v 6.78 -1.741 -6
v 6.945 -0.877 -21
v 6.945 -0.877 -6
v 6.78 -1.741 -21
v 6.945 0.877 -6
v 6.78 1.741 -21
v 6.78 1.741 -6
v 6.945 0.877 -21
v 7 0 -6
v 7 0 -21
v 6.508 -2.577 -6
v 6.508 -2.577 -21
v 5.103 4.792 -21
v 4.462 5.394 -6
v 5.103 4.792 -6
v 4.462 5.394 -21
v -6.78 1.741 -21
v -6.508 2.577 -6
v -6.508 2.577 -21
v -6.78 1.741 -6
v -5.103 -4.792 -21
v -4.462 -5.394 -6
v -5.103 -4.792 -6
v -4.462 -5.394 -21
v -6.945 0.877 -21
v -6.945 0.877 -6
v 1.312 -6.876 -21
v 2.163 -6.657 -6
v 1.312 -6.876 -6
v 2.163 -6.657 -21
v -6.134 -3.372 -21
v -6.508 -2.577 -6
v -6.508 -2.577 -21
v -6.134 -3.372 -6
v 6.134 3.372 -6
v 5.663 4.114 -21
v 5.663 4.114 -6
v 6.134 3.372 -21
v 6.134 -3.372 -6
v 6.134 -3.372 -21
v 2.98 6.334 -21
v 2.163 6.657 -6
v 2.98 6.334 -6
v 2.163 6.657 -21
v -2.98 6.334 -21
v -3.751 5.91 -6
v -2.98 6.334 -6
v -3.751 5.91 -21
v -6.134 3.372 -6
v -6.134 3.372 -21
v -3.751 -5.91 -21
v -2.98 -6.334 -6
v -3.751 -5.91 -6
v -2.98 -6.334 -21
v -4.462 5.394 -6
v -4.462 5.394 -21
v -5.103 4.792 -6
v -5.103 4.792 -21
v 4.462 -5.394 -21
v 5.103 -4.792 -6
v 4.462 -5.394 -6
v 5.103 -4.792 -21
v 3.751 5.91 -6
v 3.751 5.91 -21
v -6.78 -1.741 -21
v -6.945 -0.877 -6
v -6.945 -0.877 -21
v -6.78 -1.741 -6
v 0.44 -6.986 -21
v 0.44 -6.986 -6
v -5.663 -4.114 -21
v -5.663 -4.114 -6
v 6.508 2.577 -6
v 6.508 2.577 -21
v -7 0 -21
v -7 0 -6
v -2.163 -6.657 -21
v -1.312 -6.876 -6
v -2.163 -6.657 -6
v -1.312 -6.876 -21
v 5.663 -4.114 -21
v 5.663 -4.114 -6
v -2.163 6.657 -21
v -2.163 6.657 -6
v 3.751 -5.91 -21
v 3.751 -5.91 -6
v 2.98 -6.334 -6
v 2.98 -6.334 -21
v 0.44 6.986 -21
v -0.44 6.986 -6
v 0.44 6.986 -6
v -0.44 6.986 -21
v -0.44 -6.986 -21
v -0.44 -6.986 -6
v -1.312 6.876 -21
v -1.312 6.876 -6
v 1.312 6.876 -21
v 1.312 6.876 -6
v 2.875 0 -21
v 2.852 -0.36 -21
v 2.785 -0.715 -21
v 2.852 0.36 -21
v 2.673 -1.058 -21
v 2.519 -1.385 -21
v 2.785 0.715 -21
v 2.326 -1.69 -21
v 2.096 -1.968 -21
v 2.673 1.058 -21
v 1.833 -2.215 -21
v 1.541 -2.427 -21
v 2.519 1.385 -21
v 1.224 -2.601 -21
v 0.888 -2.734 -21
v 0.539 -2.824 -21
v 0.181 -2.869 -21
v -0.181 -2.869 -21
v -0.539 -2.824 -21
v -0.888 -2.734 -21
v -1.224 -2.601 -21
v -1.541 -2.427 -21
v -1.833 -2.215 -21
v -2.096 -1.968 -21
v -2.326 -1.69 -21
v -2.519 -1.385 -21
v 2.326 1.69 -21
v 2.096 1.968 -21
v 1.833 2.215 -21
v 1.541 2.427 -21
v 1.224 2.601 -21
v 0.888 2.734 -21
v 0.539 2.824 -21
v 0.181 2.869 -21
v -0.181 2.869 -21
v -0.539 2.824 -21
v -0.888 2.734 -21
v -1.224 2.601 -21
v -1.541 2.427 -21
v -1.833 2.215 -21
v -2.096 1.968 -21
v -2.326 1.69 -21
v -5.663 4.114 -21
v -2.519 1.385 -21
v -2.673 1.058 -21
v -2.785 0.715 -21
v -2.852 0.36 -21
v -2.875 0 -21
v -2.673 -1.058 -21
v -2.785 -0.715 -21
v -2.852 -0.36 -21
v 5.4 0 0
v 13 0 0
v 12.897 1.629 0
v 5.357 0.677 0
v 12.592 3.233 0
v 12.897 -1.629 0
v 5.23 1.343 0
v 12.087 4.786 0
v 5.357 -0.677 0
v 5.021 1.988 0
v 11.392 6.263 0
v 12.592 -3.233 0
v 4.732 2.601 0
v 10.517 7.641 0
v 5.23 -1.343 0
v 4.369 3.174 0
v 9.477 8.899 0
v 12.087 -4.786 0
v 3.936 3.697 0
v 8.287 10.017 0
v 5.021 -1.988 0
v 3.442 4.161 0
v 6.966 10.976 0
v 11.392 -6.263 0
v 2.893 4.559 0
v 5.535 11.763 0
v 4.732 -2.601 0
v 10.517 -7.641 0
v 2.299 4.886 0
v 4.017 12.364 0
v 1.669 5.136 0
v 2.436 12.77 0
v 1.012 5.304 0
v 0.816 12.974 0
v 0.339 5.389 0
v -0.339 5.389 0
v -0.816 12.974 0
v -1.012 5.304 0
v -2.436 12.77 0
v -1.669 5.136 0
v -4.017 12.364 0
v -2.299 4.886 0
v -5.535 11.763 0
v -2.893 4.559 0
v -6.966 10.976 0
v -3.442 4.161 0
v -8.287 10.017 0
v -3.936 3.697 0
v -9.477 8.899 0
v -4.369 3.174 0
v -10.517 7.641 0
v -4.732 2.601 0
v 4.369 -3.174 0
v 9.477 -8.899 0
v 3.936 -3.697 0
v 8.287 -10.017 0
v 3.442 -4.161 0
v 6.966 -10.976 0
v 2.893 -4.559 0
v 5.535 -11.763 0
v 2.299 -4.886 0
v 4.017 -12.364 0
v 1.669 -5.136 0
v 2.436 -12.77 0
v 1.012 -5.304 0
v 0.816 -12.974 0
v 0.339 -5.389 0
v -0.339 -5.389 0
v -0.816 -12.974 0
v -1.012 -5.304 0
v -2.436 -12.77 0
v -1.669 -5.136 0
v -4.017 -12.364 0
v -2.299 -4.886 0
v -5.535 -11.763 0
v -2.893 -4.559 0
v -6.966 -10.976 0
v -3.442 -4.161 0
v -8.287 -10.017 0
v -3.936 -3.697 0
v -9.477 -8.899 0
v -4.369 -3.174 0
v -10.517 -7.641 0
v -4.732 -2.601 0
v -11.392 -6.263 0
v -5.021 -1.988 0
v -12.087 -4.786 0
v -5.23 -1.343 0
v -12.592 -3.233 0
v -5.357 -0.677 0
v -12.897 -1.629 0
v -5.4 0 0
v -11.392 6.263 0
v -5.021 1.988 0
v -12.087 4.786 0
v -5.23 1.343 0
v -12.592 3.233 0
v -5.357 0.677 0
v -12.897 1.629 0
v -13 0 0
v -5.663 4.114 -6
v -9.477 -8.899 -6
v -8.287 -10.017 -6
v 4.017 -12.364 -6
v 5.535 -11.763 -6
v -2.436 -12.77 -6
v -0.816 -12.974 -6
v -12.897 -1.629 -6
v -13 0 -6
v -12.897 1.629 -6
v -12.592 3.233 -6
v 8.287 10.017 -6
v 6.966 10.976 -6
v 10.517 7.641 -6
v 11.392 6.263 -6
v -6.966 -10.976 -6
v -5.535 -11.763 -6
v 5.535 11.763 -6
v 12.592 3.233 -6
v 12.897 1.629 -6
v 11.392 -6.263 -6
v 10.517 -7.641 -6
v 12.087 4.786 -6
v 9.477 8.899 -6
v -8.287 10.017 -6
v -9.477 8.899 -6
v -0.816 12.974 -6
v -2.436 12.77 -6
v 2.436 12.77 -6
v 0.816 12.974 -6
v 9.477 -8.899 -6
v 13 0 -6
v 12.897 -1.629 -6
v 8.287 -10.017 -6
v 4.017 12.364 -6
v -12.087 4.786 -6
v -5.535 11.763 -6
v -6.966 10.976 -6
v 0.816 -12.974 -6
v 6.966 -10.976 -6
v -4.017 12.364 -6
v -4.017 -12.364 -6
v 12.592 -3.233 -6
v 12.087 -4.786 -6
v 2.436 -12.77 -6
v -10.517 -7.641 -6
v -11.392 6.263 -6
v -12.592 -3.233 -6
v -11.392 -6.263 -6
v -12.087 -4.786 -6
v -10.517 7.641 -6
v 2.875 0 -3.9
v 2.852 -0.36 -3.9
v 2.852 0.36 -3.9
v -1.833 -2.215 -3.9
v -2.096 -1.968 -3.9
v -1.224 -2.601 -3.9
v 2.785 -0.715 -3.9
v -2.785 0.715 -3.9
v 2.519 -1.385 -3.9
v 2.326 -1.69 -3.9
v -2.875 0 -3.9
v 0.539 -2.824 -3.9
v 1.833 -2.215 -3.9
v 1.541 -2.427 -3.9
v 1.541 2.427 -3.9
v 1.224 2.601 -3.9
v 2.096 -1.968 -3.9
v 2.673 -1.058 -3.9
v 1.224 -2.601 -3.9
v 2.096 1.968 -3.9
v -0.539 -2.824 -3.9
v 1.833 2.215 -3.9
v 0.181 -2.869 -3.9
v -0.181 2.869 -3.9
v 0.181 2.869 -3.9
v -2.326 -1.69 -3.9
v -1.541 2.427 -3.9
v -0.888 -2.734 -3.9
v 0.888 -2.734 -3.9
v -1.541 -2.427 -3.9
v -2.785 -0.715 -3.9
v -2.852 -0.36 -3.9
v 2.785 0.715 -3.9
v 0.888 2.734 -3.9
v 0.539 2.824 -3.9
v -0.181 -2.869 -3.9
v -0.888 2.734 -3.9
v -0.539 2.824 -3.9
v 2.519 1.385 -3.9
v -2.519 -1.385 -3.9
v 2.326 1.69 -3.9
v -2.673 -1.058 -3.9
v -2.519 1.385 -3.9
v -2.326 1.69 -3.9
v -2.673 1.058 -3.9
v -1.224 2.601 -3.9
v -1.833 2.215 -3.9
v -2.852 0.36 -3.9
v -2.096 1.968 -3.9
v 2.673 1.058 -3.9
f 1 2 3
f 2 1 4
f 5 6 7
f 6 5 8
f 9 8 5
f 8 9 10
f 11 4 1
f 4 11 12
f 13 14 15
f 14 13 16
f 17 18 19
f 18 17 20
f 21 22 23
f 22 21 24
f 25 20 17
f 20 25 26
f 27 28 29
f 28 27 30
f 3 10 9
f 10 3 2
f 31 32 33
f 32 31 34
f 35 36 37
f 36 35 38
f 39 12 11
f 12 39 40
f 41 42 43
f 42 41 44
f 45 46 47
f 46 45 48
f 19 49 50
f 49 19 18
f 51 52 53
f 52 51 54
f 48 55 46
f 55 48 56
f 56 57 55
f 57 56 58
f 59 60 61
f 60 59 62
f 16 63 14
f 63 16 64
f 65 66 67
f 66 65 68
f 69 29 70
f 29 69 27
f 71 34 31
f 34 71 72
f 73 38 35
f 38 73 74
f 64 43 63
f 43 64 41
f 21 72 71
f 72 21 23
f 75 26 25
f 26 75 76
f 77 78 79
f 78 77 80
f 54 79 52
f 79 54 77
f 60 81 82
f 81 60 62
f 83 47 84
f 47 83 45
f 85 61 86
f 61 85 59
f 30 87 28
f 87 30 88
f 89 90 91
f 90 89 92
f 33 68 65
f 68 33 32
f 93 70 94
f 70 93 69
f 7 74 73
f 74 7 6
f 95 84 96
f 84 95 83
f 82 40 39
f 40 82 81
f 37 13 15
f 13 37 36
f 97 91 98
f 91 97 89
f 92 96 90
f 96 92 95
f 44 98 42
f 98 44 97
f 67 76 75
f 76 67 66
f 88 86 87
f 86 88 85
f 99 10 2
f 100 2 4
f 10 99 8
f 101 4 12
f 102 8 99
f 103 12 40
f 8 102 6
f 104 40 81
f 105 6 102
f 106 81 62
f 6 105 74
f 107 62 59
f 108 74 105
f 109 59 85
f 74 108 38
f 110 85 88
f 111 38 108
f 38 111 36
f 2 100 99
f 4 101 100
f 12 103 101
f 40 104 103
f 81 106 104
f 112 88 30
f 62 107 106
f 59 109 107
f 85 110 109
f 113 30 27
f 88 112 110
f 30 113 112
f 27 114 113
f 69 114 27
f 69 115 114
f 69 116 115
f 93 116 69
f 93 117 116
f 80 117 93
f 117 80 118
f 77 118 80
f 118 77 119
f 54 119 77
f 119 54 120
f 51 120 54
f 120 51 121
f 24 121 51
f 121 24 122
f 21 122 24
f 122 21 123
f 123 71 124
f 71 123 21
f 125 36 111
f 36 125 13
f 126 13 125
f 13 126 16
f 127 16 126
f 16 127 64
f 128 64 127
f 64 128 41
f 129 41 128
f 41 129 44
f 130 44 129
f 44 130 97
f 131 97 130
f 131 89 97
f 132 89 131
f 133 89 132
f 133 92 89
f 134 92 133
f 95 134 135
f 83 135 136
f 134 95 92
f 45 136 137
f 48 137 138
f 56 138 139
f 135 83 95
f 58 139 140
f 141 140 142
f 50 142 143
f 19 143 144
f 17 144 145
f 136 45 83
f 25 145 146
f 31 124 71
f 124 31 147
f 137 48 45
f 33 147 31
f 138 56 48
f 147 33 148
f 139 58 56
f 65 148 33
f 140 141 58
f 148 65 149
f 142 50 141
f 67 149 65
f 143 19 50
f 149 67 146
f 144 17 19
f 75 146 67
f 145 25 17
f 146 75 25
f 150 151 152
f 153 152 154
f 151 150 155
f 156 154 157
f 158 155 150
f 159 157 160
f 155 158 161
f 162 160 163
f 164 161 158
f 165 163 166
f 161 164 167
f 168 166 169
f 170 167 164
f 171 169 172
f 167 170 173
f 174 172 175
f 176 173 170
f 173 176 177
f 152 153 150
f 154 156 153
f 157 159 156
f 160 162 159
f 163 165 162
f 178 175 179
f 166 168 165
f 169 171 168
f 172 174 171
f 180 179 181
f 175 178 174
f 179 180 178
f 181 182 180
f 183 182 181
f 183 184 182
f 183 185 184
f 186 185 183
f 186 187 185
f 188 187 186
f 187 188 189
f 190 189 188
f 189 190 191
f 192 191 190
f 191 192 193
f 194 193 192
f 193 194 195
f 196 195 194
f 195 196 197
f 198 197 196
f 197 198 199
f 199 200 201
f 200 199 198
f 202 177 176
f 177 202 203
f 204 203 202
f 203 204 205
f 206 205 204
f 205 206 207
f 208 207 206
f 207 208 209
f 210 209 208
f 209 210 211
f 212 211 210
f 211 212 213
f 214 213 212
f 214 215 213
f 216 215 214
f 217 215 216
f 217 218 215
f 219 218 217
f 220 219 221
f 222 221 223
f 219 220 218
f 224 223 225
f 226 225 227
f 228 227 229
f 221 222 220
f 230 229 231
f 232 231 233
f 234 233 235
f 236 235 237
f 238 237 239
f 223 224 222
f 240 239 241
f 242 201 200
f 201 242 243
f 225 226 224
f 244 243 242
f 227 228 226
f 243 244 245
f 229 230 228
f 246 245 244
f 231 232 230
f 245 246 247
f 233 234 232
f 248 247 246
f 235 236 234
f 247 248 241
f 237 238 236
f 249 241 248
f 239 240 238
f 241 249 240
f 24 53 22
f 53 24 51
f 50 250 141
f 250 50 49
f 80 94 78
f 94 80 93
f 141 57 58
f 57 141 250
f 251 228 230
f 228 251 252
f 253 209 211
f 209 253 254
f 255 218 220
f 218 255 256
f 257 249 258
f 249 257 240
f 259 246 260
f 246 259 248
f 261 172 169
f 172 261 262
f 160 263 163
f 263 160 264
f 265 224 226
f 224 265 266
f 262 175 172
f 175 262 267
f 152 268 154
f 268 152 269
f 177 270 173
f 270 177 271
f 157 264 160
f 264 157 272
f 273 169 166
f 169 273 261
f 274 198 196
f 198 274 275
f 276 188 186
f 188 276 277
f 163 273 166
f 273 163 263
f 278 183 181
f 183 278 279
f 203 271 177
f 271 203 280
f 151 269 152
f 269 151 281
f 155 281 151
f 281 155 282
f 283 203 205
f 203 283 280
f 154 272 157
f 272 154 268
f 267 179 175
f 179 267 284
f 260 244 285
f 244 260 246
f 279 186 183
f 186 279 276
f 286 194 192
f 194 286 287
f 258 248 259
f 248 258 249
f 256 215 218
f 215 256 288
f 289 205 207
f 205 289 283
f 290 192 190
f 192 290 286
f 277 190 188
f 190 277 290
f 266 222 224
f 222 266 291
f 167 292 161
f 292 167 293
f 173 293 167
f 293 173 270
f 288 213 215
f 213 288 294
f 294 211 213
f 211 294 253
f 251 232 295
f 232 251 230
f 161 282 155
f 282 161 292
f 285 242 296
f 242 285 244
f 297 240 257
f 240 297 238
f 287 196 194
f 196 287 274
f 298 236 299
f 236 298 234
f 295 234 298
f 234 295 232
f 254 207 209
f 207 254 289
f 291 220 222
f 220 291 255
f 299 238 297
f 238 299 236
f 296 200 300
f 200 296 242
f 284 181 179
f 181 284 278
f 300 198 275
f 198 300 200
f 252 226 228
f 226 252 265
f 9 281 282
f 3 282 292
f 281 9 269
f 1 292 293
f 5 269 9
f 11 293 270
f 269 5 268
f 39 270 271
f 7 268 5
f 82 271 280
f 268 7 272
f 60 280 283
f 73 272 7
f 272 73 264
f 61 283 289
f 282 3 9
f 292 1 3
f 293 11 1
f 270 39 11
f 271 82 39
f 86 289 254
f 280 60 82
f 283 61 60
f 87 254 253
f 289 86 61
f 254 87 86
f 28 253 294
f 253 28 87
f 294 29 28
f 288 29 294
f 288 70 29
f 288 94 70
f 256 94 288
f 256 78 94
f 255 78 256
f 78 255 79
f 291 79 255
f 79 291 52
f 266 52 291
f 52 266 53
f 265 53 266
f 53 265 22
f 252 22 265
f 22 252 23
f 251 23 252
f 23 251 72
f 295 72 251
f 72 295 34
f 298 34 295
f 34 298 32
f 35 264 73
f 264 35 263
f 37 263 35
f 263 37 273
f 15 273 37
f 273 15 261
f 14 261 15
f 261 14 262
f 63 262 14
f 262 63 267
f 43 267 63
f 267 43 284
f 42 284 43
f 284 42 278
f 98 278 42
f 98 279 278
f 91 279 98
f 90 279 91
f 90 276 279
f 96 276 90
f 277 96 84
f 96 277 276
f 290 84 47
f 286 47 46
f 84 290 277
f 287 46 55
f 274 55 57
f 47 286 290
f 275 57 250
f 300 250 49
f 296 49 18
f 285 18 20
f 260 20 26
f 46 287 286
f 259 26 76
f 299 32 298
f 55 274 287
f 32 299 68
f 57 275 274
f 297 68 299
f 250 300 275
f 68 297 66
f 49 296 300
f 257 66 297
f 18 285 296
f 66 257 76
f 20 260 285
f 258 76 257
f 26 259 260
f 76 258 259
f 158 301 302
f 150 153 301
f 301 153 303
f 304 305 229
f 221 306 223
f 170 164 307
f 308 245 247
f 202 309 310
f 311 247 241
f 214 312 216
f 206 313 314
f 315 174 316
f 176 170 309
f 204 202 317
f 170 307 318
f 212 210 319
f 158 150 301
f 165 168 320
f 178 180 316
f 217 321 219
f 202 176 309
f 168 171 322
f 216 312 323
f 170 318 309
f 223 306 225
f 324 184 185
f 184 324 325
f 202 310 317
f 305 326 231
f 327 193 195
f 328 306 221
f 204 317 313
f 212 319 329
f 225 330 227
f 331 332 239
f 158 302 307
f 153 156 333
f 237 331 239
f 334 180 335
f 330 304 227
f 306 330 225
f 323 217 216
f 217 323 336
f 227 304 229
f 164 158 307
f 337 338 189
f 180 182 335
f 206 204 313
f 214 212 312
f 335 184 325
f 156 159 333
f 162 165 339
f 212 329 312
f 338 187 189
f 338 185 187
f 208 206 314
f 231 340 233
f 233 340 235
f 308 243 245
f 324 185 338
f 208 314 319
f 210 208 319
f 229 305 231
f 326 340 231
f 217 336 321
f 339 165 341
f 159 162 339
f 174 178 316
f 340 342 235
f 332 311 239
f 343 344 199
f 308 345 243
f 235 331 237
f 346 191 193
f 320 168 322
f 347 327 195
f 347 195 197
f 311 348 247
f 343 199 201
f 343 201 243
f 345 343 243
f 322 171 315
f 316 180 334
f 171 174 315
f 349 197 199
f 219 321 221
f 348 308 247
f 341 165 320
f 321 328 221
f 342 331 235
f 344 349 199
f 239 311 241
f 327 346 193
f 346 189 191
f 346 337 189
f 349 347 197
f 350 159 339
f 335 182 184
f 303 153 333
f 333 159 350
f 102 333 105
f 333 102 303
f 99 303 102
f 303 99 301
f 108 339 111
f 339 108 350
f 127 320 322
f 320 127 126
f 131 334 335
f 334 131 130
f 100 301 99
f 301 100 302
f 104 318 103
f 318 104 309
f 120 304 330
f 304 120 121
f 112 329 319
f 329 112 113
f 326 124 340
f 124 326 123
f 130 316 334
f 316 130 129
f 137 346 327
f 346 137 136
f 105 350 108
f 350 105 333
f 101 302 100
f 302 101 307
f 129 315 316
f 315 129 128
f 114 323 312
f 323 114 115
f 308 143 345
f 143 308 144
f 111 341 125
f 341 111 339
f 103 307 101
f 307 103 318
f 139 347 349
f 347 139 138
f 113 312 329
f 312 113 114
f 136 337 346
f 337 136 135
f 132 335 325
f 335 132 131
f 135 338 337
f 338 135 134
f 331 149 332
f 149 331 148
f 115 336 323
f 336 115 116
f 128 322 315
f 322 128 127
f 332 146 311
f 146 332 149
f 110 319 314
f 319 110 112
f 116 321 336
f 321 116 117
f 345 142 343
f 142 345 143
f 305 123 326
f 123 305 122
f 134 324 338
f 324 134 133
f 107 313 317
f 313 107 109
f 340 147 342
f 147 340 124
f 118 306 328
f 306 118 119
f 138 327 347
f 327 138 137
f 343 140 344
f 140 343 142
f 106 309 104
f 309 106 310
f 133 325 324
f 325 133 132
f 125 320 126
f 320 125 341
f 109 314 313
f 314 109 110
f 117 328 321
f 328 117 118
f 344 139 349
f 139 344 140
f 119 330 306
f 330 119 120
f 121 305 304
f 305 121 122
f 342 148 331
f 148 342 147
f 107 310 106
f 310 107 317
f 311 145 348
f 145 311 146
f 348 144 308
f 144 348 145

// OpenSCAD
$fn = 50;


difference() {
	union() {
		translate(v = [0, 0, -21.0000000000]) {
			cylinder(h = 21, r = 7.0000000000);
		}
		translate(v = [0, 0, -6.0000000000]) {
			cylinder(h = 6, r = 13.0000000000);
		}
	}
	union() {
		translate(v = [0, 0, 0]) {
			rotate(a = [0, 0, 0]) {
				difference() {
					union() {
						#translate(v = [0, 0, -21.0000000000]) {
							cylinder(h = 21, r = 2.6000000000);
						}
						#translate(v = [0, 0, -3.9000000000]) {
							cylinder(h = 3.9000000000, r = 7.0000000000, r1 = 2.8750000000, r2 = 5.4000000000);
						}
						#translate(v = [0, 0, -21.0000000000]) {
							cylinder(h = 21, r = 2.8750000000);
						}
						#translate(v = [0, 0, -21.0000000000]) {
							cylinder(h = 21, r = 2.6000000000);
						}
					}
					union();
				}
			}
		}
	}
}
